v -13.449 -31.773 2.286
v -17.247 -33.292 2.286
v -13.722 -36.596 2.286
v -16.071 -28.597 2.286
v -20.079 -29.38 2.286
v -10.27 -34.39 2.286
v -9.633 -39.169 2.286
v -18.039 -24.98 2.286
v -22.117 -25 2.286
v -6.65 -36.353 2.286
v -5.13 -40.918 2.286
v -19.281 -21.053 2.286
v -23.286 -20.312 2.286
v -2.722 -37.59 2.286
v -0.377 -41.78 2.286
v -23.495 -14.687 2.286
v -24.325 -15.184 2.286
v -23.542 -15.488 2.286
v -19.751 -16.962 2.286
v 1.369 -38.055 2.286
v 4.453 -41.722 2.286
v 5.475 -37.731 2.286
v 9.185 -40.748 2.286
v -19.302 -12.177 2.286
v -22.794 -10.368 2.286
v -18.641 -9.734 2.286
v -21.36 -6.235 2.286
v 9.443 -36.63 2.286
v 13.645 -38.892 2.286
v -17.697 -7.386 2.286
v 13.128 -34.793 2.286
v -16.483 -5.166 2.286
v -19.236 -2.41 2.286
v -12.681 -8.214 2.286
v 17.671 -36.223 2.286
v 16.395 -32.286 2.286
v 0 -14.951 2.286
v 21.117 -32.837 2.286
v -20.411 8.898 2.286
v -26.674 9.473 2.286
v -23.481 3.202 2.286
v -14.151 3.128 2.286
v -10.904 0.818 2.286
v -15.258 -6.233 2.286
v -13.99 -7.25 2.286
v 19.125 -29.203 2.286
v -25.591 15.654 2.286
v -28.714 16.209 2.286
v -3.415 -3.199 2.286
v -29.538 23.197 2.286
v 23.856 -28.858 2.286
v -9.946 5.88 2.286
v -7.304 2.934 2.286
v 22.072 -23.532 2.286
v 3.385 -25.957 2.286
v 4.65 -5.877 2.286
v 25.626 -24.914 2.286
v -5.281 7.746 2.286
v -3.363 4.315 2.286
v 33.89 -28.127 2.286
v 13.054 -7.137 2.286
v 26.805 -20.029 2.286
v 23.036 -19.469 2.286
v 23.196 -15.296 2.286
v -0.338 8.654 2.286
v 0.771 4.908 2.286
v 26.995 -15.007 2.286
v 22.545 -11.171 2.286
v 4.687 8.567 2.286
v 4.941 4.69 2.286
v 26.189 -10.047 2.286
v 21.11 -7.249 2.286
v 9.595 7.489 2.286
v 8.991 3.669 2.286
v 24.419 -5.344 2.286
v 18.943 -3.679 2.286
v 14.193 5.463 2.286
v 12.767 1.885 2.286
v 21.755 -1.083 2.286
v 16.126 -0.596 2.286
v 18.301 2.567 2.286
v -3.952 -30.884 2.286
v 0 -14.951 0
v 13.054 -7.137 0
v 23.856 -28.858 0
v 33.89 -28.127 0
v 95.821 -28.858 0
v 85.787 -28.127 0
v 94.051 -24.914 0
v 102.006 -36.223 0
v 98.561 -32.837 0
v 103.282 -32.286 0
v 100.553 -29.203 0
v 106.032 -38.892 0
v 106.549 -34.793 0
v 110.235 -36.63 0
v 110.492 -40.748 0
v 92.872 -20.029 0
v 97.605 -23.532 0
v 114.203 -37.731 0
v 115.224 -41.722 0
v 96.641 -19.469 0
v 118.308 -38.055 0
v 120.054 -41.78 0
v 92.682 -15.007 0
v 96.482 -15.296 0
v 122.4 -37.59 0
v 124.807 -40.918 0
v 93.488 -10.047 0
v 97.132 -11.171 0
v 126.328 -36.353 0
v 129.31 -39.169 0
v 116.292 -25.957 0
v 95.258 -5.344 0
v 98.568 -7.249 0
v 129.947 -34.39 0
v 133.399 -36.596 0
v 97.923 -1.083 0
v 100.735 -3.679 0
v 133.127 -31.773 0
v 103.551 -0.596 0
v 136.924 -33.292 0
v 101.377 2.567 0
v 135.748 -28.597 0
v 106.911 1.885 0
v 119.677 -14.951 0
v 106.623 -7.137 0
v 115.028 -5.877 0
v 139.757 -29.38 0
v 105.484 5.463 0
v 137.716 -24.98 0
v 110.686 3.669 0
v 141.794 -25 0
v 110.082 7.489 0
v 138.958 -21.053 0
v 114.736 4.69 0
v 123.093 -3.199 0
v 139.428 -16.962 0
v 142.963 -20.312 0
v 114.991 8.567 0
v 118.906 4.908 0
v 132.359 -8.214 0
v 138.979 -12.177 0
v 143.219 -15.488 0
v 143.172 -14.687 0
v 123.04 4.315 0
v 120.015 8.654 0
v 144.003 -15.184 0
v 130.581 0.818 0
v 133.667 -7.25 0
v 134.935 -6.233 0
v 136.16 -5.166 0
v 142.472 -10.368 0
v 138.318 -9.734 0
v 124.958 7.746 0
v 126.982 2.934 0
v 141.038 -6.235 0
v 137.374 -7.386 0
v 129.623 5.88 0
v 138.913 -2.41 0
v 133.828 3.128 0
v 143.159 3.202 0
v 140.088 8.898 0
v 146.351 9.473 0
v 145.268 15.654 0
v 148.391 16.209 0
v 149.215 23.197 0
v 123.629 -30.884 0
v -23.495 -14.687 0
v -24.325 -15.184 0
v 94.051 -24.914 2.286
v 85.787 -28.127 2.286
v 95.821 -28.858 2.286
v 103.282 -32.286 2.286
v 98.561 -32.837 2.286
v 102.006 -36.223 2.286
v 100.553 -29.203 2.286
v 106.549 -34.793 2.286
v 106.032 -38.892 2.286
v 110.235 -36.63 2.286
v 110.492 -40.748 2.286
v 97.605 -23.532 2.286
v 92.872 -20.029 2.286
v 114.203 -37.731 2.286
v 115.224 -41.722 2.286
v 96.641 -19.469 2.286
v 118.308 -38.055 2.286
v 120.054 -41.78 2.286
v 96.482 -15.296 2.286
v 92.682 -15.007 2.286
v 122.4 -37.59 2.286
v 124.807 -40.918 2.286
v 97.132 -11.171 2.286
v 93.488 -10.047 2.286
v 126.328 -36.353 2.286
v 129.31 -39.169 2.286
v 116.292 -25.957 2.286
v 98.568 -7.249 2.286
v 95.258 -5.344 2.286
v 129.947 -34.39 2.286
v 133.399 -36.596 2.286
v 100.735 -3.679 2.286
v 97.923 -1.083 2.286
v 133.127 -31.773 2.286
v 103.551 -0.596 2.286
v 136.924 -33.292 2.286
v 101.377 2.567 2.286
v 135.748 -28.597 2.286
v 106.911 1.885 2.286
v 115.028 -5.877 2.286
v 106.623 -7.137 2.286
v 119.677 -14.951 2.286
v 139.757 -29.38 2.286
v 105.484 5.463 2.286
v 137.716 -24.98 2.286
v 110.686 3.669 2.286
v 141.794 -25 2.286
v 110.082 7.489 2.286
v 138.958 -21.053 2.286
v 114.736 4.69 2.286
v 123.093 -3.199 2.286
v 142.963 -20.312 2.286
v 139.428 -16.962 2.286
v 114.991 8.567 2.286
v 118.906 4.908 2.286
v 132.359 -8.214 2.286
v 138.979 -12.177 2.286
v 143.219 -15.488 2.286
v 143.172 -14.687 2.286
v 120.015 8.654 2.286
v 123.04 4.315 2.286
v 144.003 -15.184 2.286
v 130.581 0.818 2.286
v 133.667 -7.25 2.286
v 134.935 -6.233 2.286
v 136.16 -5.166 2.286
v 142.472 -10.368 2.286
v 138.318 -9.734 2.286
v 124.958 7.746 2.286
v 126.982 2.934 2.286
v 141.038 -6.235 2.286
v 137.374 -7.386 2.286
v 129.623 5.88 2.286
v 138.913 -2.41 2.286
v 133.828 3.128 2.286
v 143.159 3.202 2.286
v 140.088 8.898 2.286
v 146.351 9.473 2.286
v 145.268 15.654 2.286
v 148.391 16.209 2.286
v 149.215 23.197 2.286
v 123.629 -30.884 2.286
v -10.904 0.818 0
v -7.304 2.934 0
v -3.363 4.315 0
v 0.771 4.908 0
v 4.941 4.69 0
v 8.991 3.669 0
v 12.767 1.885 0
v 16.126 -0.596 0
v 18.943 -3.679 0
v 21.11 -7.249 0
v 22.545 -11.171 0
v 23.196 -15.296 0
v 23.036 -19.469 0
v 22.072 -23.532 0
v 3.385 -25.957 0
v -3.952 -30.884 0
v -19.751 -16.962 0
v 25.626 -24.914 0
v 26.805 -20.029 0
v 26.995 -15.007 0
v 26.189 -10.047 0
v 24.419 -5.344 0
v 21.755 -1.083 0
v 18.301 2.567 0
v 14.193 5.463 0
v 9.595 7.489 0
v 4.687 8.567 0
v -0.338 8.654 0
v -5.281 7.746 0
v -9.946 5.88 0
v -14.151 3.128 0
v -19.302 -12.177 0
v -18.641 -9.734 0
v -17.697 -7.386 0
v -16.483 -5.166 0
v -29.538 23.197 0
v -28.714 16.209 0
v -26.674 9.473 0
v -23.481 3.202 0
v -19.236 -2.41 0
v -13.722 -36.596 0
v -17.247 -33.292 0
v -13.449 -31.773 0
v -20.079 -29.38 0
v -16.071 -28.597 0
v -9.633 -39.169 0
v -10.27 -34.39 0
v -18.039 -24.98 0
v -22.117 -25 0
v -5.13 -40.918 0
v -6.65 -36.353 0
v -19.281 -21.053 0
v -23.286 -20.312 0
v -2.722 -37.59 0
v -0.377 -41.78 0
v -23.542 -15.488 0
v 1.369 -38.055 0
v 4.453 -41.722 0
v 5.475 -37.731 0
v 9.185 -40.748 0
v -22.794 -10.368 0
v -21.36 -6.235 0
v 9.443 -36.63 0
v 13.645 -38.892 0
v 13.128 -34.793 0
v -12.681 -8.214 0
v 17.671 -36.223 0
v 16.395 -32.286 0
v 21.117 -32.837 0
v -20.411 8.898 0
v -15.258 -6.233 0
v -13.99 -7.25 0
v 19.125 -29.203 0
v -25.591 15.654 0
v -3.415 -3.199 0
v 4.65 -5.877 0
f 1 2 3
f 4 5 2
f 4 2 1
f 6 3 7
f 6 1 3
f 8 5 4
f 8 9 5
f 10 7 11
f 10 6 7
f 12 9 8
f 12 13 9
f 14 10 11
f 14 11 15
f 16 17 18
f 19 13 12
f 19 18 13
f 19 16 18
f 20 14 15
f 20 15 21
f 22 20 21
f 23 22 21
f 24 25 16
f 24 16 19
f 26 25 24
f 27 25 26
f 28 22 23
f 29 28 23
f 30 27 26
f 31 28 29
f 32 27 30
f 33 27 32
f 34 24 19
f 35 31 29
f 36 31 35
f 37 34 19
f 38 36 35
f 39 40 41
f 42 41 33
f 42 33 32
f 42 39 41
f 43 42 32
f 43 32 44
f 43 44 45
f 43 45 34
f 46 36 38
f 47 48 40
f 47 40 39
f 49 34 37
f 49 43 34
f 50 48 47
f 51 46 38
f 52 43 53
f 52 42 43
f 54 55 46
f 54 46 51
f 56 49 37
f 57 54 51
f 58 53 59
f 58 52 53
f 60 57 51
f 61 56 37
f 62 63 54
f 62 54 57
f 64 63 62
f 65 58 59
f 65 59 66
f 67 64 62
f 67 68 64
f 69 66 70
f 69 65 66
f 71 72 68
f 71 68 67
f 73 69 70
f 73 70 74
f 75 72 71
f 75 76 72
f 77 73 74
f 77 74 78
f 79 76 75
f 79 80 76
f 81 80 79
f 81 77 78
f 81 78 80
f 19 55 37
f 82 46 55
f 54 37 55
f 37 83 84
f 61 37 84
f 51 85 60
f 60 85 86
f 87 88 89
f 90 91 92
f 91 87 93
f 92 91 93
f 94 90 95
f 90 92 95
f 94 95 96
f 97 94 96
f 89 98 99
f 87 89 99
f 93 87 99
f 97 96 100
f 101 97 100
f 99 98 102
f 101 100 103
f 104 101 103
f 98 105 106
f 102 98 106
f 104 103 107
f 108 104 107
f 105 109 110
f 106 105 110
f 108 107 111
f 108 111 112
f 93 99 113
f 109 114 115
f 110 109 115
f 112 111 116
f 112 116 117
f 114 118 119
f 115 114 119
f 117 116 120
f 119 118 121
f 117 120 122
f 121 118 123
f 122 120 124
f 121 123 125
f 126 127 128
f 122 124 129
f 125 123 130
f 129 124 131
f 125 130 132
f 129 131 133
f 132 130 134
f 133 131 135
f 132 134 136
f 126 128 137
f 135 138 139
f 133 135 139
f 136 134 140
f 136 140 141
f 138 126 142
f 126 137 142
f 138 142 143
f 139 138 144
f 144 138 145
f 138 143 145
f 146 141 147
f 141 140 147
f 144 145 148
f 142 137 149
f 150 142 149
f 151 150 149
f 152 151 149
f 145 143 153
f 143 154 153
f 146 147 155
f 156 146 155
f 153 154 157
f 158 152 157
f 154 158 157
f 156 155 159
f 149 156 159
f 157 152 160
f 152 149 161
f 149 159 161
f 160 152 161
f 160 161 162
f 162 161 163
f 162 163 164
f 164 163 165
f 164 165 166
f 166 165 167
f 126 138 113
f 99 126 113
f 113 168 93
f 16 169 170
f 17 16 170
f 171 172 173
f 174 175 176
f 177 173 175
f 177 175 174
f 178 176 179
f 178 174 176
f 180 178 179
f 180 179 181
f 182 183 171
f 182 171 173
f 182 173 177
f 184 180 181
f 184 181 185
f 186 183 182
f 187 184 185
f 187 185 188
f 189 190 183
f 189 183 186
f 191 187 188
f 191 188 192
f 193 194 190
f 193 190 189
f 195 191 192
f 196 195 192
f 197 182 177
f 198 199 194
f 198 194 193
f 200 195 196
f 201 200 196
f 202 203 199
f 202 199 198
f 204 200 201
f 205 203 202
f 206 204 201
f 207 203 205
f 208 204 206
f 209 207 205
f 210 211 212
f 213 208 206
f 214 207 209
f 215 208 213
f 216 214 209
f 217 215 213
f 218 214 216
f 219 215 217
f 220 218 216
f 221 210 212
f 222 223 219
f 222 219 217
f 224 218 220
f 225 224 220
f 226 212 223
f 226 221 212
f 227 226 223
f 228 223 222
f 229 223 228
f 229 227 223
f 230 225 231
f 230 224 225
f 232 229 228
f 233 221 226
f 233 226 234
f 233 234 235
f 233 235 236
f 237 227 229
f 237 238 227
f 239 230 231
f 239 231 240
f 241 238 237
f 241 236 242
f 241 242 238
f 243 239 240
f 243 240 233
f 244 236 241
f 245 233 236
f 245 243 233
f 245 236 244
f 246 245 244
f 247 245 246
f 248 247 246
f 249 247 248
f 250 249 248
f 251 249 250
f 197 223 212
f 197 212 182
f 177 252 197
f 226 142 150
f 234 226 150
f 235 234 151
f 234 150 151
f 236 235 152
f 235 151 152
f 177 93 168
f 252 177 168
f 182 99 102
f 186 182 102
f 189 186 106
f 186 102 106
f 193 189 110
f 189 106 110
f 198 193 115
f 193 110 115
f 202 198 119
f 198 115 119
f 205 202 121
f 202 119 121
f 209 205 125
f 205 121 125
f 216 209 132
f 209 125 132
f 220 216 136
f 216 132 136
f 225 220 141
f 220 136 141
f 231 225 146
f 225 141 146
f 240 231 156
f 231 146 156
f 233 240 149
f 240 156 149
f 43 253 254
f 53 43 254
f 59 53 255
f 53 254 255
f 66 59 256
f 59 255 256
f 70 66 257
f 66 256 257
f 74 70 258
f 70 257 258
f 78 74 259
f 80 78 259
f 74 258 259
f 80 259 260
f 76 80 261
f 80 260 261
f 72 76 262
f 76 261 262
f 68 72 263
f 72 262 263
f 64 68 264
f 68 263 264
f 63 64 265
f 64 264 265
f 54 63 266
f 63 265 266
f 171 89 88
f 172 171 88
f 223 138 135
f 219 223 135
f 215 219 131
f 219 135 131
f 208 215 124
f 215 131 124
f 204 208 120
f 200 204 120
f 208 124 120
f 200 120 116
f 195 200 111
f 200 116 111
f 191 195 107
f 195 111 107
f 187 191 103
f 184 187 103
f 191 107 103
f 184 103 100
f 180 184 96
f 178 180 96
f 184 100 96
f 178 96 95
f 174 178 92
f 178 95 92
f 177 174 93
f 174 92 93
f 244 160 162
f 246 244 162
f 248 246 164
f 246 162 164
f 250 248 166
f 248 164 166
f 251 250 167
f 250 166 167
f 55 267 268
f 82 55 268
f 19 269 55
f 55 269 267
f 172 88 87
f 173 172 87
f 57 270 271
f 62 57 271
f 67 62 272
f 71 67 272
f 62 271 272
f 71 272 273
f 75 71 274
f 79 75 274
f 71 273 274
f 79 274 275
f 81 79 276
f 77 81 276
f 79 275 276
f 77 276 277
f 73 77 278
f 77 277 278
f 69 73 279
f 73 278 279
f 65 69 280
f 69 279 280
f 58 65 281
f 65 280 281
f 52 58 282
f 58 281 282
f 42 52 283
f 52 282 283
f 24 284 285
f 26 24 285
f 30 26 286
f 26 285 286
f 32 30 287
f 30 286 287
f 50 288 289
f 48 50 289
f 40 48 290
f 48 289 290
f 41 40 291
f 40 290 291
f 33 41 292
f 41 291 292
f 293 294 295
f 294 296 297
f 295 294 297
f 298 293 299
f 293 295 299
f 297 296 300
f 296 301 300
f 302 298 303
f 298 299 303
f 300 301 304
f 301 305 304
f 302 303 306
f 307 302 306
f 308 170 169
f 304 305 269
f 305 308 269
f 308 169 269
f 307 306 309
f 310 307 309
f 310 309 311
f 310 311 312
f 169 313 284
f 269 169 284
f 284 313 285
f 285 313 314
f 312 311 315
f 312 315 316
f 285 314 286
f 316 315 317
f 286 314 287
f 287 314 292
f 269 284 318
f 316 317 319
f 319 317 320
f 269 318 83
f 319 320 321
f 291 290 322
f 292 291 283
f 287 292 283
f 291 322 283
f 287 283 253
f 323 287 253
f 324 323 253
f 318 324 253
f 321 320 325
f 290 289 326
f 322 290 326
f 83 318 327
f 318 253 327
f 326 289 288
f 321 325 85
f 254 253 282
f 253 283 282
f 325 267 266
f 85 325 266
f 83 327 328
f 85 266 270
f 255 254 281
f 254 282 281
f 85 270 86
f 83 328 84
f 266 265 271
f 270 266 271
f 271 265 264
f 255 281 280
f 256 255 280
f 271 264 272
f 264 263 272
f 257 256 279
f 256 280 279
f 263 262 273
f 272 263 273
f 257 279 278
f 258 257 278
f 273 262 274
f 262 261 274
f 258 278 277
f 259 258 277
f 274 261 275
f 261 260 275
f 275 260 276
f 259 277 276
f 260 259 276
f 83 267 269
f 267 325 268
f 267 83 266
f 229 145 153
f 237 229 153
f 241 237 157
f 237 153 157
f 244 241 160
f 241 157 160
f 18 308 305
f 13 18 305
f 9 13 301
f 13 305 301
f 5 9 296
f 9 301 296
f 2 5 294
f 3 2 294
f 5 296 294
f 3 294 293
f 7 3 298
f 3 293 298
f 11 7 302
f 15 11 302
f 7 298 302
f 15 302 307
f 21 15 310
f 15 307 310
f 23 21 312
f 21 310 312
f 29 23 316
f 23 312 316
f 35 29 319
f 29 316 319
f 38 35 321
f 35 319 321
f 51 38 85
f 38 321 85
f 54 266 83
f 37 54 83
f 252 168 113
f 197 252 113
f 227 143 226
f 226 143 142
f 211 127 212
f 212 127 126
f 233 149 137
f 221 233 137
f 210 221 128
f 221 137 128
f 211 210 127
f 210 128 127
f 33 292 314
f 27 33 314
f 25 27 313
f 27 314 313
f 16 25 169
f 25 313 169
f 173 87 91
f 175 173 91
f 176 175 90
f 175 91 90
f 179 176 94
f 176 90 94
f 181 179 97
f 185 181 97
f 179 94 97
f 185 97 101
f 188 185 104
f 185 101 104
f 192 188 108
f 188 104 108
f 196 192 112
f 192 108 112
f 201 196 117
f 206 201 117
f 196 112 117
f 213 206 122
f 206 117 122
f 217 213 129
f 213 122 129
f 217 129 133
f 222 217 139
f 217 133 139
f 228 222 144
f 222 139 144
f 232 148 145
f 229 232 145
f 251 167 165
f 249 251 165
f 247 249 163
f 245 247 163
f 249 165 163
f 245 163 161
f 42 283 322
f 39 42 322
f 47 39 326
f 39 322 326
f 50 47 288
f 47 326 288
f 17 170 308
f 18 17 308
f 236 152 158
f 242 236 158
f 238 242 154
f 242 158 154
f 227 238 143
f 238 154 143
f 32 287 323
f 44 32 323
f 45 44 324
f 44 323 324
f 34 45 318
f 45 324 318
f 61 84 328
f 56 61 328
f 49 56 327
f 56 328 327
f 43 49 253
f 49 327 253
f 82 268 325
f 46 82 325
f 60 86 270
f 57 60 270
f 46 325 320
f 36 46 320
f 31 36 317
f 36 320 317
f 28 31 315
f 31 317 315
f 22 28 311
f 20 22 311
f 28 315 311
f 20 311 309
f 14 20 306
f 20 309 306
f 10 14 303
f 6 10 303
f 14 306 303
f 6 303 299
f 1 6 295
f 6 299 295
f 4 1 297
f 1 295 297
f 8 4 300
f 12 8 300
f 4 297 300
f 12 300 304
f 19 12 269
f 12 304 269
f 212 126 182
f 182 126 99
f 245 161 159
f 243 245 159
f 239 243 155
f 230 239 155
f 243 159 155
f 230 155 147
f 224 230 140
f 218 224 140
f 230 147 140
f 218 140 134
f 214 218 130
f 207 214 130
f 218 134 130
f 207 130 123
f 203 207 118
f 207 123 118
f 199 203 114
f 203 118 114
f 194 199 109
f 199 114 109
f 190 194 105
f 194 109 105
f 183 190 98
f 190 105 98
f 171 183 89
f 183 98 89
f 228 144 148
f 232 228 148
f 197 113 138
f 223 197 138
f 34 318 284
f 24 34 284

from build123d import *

# Parameters (mm, degrees)
F1_DEPTH = 2.286


with BuildPart() as f1:
    # F0 (on Top) → F1 (new body)
    with BuildSketch(Plane.XY):
        with BuildLine():
            ThreePointArc((-14.151137, 3.12794), (-23.146418, 12.164408), (-29.537588, 23.197347))
            ThreePointArc((-29.537588, 23.197347), (-26.67385, 9.473455), (-19.235755, -2.410189))
            ThreePointArc((-19.235755, -2.410189), (-22.166841, -8.270383), (-23.494955, -14.68671))
            Line((-23.494955, -14.68671), (-24.325447, -15.183814))
            Line((-24.325447, -15.183814), (-23.541831, -15.488469))
            ThreePointArc((-23.541831, -15.488469), (-5.130261, -40.917872), (23.855921, -28.85795))
            Line((23.855921, -28.85795), (33.889789, -28.126737))
            Line((33.889789, -28.126737), (25.62577, -24.913837))
            ThreePointArc((25.62577, -24.913837), (16.318953, 4.11697), (-14.151137, 3.12794))
        make_face()
        with BuildLine():
            Line((3.385204, -25.957212), (-3.952149, -30.884448))
            Line((-3.952149, -30.884448), (19.124659, -29.202738))
            ThreePointArc((19.124659, -29.202738), (-4.716031, -37.065924), (-19.751027, -16.962265))
            Line((-19.751027, -16.962265), (3.385204, -25.957212))
        make_face(mode=Mode.SUBTRACT)
        with BuildLine():
            ThreePointArc((-19.302198, -12.177071), (-18.203266, -8.546433), (-16.4832, -5.165523))
            ThreePointArc((-16.4832, -5.165523), (-14.628897, -6.747939), (-12.681336, -8.214052))
            Line((-12.681336, -8.214052), (-19.302198, -12.177071))
        make_face(mode=Mode.SUBTRACT)
        with BuildLine():
            Line((0, -14.951002), (13.053741, -7.137484))
            ThreePointArc((13.053741, -7.137484), (0.559608, -4.711412), (-10.904191, 0.817648))
            ThreePointArc((-10.904191, 0.817648), (14.506792, 0.726552), (22.072211, -23.532277))
            Line((22.072211, -23.532277), (0, -14.951002))
        make_face(mode=Mode.SUBTRACT)
        with BuildLine():
            ThreePointArc((133.828345, 3.12794), (103.358255, 4.11697), (94.051438, -24.913837))
            Line((94.051438, -24.913837), (85.787419, -28.126737))
            Line((85.787419, -28.126737), (95.821288, -28.85795))
            ThreePointArc((95.821288, -28.85795), (124.807469, -40.917872), (143.219039, -15.488469))
            Line((143.219039, -15.488469), (144.002655, -15.183814))
            Line((144.002655, -15.183814), (143.172164, -14.68671))
            ThreePointArc((143.172164, -14.68671), (141.844049, -8.270383), (138.912963, -2.410189))
            ThreePointArc((138.912963, -2.410189), (146.351058, 9.473455), (149.214797, 23.197347))
            ThreePointArc((149.214797, 23.197347), (142.823626, 12.164408), (133.828345, 3.12794))
        make_face()
        with BuildLine():
            Line((116.292004, -25.957212), (139.428235, -16.962265))
            ThreePointArc((139.428235, -16.962265), (124.39324, -37.065924), (100.55255, -29.202738))
            Line((100.55255, -29.202738), (123.629357, -30.884448))
            Line((123.629357, -30.884448), (116.292004, -25.957212))
        make_face(mode=Mode.SUBTRACT)
        with BuildLine():
            Line((119.677208, -14.951002), (97.604997, -23.532277))
            ThreePointArc((97.604997, -23.532277), (105.170417, 0.726552), (130.5814, 0.817648))
            ThreePointArc((130.5814, 0.817648), (119.117601, -4.711412), (106.623467, -7.137484))
            Line((106.623467, -7.137484), (119.677208, -14.951002))
        make_face(mode=Mode.SUBTRACT)
        with BuildLine():
            ThreePointArc((136.160409, -5.165523), (137.880474, -8.546433), (138.979407, -12.177071))
            Line((138.979407, -12.177071), (132.358544, -8.214052))
            ThreePointArc((132.358544, -8.214052), (134.306105, -6.747939), (136.160409, -5.165523))
        make_face(mode=Mode.SUBTRACT)
    extrude(amount=F1_DEPTH)


solid = f1.part
